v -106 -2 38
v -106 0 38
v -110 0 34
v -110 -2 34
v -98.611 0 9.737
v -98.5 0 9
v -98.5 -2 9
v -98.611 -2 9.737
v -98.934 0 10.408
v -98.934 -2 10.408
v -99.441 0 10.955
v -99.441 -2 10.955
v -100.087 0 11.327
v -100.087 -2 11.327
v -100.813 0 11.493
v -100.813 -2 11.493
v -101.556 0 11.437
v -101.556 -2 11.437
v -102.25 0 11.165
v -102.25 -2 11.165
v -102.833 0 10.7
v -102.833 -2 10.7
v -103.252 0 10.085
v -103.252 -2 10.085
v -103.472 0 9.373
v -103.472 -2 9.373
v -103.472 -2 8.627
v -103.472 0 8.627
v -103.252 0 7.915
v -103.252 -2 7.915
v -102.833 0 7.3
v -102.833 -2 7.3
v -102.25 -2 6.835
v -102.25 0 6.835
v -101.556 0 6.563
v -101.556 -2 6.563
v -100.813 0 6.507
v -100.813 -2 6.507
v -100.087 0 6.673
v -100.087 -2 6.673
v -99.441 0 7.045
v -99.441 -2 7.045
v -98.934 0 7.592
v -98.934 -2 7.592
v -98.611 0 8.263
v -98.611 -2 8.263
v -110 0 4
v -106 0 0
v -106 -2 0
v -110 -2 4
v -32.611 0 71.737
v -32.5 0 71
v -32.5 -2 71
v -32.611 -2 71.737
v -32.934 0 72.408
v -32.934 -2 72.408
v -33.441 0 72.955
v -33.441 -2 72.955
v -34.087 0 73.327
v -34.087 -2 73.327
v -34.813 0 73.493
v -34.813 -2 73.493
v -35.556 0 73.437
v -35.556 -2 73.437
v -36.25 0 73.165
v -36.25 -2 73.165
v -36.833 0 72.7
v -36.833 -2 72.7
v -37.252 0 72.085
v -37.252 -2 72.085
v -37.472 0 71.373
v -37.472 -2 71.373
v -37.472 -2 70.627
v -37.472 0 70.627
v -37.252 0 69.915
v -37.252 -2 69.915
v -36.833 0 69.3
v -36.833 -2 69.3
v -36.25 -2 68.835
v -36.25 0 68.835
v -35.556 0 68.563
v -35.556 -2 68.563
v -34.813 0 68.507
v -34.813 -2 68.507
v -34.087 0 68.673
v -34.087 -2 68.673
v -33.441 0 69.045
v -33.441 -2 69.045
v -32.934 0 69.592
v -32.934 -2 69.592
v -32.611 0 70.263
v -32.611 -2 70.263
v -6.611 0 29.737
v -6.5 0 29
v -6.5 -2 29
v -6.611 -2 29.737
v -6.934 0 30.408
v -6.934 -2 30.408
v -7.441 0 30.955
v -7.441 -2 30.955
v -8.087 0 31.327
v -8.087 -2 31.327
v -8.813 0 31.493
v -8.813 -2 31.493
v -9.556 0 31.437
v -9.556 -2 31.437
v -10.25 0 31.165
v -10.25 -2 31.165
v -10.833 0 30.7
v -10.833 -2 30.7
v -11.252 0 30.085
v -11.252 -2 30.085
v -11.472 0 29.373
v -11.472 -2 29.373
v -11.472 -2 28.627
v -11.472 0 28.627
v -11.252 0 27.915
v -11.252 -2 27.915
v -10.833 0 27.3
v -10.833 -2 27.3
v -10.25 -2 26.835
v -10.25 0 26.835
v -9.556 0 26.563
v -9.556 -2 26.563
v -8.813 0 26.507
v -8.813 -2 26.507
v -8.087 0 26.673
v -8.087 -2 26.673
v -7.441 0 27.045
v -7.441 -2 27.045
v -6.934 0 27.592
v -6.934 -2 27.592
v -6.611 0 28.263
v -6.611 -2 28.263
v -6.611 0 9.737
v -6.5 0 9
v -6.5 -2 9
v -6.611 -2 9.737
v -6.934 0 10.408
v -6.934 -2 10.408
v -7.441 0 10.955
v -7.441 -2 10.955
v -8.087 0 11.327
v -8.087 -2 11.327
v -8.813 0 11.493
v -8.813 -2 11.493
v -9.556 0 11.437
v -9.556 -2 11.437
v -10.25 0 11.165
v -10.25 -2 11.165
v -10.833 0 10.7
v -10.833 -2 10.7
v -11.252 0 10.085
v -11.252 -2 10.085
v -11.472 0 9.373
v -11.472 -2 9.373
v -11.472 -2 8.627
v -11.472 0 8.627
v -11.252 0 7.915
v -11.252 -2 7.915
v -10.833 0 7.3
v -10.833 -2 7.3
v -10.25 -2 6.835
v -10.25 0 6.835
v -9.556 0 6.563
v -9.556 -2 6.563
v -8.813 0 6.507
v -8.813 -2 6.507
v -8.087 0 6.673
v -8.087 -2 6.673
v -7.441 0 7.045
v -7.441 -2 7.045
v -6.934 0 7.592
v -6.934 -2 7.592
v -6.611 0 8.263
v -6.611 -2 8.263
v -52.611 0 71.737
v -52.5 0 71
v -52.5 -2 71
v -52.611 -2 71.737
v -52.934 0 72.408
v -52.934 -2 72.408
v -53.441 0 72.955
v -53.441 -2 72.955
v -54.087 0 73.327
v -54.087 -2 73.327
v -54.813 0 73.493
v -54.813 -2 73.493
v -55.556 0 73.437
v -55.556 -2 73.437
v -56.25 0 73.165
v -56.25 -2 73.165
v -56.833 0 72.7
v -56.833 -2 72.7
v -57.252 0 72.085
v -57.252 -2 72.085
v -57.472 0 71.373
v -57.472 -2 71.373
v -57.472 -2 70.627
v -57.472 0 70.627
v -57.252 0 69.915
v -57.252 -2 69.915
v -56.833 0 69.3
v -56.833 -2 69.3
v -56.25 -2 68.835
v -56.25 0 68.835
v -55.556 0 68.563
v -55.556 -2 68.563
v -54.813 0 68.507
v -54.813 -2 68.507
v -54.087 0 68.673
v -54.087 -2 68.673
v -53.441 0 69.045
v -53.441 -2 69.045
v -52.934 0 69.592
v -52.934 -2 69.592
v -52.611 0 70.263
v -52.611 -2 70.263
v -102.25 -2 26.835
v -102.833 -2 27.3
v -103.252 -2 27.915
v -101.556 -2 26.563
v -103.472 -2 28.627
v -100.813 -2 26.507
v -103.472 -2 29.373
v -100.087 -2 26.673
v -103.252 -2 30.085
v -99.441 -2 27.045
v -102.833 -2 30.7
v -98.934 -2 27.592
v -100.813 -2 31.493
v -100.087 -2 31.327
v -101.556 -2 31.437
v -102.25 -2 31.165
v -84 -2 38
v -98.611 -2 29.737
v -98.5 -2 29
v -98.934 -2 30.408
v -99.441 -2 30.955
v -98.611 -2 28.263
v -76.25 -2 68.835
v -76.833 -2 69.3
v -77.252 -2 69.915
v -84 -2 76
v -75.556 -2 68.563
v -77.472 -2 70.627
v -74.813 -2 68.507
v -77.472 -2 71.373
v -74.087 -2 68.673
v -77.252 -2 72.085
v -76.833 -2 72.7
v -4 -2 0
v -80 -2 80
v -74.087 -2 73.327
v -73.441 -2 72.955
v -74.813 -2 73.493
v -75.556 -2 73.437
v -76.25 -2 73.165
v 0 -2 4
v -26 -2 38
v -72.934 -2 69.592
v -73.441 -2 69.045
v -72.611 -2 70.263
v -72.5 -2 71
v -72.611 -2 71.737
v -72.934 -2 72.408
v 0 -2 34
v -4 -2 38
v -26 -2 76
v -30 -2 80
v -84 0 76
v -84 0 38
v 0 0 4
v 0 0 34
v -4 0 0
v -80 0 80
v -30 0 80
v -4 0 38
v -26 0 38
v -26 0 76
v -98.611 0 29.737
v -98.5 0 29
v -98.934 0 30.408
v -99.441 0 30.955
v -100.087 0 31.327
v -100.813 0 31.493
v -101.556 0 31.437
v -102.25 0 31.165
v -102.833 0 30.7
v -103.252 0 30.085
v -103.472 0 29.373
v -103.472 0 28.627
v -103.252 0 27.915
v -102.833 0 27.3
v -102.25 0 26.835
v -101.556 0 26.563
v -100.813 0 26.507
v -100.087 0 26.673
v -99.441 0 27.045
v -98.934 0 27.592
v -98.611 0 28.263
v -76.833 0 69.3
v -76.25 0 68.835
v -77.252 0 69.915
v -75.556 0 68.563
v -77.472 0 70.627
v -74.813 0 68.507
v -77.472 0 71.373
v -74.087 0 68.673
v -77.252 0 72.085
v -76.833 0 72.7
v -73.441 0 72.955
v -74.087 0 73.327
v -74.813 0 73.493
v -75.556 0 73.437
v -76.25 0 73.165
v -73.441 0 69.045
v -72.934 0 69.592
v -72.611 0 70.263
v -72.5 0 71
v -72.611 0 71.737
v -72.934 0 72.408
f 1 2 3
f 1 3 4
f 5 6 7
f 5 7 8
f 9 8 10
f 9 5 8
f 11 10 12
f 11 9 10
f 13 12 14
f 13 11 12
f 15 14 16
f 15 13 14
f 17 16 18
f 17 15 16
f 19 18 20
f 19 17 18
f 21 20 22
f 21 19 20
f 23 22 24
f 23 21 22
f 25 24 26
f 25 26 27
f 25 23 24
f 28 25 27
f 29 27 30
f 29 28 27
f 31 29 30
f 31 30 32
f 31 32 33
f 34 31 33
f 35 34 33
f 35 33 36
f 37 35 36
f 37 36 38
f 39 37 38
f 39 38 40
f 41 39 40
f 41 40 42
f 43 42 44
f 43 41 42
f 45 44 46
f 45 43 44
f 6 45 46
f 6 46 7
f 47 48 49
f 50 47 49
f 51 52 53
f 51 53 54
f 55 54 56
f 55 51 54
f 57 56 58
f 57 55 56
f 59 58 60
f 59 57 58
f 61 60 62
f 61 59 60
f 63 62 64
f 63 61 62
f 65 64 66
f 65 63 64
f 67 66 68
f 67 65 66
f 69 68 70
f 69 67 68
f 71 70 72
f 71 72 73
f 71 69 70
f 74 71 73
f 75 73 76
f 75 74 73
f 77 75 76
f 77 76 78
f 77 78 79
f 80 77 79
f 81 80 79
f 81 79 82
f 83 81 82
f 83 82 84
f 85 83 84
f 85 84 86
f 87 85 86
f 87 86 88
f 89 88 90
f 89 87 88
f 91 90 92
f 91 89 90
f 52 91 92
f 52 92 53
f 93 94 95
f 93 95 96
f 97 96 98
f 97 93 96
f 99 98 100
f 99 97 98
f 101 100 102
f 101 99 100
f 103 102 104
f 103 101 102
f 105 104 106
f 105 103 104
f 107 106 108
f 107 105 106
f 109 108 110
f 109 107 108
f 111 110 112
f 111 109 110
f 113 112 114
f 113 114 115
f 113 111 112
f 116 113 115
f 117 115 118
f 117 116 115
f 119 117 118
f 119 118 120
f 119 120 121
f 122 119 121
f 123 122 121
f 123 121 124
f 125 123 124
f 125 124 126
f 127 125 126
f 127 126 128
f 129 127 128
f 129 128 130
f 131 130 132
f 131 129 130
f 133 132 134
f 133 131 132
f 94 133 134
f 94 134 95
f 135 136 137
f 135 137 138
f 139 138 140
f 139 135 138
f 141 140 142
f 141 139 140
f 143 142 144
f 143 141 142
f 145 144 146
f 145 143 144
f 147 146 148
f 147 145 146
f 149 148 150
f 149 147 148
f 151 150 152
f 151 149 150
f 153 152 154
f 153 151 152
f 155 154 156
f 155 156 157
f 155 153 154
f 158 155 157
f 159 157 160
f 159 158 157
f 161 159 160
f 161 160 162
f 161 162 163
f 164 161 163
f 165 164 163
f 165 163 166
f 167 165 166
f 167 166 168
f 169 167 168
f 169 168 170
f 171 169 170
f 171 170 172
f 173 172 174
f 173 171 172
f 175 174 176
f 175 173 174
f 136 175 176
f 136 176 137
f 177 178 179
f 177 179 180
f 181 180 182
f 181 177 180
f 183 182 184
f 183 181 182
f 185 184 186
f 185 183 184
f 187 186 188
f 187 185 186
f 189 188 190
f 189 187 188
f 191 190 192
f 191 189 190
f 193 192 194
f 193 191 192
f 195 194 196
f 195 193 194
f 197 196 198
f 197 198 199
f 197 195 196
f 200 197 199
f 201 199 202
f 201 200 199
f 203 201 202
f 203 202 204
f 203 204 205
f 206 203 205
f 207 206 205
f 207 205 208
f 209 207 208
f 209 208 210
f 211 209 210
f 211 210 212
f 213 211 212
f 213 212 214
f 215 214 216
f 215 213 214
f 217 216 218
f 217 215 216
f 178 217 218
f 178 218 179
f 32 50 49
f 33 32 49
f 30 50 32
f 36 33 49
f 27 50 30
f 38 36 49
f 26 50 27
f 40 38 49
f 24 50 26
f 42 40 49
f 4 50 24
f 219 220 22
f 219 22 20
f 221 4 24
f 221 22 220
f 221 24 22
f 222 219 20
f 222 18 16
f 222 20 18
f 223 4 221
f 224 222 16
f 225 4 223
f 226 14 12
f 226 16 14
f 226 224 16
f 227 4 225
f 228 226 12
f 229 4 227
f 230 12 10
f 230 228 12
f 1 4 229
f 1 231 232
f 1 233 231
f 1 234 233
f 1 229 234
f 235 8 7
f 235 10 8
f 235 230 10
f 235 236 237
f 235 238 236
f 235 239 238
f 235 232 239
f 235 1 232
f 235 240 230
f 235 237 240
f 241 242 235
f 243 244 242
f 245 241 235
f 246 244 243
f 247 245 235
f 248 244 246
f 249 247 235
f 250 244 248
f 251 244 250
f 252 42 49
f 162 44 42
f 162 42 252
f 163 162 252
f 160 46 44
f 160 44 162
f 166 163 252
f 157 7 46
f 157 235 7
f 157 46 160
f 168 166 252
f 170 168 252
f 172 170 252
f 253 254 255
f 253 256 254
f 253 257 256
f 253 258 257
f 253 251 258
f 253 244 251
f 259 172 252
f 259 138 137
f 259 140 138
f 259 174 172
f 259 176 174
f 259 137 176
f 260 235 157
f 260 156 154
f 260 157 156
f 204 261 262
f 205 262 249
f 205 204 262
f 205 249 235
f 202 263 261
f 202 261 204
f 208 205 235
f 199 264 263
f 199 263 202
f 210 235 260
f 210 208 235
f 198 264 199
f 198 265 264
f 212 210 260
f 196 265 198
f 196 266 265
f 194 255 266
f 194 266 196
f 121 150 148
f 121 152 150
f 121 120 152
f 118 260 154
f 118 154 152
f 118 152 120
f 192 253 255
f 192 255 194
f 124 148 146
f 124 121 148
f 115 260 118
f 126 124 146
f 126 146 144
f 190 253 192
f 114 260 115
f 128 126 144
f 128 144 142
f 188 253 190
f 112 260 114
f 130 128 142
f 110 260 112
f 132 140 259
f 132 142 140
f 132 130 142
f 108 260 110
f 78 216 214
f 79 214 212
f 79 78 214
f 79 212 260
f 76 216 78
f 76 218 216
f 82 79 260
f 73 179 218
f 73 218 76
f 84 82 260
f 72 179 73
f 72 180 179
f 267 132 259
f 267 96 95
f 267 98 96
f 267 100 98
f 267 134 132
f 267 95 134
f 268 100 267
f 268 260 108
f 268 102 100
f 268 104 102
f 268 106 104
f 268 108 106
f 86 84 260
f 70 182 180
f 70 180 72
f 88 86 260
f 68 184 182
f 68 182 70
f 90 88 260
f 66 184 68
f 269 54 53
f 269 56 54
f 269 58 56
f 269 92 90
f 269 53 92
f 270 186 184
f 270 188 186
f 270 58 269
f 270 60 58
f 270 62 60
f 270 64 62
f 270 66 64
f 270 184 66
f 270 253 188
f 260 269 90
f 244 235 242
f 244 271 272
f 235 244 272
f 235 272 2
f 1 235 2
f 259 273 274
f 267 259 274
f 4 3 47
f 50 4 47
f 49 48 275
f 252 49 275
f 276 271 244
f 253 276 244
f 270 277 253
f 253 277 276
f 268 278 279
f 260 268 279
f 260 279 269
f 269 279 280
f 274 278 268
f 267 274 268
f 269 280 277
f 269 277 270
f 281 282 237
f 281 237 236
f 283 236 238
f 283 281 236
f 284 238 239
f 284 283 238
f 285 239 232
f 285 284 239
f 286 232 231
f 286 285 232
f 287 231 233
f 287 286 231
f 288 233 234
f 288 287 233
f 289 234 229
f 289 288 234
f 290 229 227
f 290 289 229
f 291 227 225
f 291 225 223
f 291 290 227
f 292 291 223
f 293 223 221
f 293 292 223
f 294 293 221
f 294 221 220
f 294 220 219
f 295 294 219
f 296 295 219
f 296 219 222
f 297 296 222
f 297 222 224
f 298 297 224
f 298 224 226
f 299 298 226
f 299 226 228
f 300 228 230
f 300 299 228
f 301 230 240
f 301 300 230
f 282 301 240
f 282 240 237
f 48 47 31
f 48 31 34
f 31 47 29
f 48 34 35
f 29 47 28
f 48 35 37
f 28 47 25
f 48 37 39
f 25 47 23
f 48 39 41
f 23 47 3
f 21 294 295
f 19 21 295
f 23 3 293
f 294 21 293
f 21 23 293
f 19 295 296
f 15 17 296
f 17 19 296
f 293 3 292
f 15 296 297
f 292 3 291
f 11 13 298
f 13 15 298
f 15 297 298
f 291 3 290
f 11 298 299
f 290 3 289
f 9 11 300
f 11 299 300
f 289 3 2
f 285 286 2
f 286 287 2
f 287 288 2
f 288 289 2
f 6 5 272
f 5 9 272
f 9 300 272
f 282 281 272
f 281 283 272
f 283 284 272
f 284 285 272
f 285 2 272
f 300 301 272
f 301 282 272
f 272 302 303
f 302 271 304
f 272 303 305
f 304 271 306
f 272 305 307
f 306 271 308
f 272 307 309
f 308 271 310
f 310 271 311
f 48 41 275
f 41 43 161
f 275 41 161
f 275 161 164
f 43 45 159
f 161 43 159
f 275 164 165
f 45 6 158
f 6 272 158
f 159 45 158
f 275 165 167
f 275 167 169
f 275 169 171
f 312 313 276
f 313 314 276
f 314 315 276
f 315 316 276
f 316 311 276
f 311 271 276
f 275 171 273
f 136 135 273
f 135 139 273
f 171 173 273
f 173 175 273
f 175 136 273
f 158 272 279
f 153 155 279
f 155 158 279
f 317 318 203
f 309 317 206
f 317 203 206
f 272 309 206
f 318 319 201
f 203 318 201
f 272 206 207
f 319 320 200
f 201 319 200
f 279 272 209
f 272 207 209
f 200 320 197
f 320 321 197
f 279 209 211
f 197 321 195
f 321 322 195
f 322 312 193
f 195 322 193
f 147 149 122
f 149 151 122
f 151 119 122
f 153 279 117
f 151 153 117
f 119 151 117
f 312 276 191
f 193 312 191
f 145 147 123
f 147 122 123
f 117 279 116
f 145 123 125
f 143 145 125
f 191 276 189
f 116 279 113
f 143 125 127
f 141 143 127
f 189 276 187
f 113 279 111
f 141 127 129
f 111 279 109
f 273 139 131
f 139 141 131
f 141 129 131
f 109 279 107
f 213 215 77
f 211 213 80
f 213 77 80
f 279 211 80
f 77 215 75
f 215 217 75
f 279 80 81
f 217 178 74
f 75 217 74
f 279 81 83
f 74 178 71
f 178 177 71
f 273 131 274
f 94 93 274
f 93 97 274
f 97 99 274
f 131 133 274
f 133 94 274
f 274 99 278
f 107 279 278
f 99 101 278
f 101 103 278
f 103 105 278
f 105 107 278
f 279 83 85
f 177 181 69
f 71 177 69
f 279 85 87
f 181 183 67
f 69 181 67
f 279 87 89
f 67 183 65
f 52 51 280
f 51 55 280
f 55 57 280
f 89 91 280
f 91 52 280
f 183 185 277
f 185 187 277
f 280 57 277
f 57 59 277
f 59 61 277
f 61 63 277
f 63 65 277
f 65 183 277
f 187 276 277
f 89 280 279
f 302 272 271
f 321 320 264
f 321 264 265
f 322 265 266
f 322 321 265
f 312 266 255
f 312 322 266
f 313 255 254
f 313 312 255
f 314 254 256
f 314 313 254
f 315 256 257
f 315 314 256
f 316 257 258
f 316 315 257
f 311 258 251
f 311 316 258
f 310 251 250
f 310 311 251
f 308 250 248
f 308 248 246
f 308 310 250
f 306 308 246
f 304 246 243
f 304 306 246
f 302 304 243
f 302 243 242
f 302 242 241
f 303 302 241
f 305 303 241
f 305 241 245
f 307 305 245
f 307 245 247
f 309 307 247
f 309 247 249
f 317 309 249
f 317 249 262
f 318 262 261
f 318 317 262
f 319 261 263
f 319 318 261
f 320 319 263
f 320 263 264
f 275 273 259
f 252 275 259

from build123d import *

# Parameters (mm, degrees)
F0_R     = 2.5
F1_DEPTH = 2
F2_SIZE  = 4


with BuildPart() as f1:
    # F0 (on Front) → F1 (new body)
    with BuildSketch(Plane.XZ):
        Polygon((-110, 38), (-110, 0), (0, 0), (0, 38), (-26, 38), (-26, 80), (-84, 80), (-84, 38), align=None)
        with Locations((-101, 9)):
            Circle(F0_R, mode=Mode.SUBTRACT)
        with Locations((-101, 29)):
            Circle(F0_R, mode=Mode.SUBTRACT)
        with Locations((-9, 9)):
            Circle(F0_R, mode=Mode.SUBTRACT)
        with Locations((-9, 29)):
            Circle(F0_R, mode=Mode.SUBTRACT)
        with Locations((-75, 71)):
            Circle(F0_R, mode=Mode.SUBTRACT)
        with Locations((-55, 71)):
            Circle(F0_R, mode=Mode.SUBTRACT)
        with Locations((-35, 71)):
            Circle(F0_R, mode=Mode.SUBTRACT)
    extrude(amount=F1_DEPTH)

    # F2
    f2_edges = [f1.edges().sort_by_distance(p)[0] for p in [
        (-26, -1, 80),
        (-84, -1, 80),
        (0, -1, 38),
        (-110, -1, 38),
        (0, -1, 0),
        (-110, -1, 0),
    ]]
    chamfer(f2_edges, length=F2_SIZE)


solid = f1.part
